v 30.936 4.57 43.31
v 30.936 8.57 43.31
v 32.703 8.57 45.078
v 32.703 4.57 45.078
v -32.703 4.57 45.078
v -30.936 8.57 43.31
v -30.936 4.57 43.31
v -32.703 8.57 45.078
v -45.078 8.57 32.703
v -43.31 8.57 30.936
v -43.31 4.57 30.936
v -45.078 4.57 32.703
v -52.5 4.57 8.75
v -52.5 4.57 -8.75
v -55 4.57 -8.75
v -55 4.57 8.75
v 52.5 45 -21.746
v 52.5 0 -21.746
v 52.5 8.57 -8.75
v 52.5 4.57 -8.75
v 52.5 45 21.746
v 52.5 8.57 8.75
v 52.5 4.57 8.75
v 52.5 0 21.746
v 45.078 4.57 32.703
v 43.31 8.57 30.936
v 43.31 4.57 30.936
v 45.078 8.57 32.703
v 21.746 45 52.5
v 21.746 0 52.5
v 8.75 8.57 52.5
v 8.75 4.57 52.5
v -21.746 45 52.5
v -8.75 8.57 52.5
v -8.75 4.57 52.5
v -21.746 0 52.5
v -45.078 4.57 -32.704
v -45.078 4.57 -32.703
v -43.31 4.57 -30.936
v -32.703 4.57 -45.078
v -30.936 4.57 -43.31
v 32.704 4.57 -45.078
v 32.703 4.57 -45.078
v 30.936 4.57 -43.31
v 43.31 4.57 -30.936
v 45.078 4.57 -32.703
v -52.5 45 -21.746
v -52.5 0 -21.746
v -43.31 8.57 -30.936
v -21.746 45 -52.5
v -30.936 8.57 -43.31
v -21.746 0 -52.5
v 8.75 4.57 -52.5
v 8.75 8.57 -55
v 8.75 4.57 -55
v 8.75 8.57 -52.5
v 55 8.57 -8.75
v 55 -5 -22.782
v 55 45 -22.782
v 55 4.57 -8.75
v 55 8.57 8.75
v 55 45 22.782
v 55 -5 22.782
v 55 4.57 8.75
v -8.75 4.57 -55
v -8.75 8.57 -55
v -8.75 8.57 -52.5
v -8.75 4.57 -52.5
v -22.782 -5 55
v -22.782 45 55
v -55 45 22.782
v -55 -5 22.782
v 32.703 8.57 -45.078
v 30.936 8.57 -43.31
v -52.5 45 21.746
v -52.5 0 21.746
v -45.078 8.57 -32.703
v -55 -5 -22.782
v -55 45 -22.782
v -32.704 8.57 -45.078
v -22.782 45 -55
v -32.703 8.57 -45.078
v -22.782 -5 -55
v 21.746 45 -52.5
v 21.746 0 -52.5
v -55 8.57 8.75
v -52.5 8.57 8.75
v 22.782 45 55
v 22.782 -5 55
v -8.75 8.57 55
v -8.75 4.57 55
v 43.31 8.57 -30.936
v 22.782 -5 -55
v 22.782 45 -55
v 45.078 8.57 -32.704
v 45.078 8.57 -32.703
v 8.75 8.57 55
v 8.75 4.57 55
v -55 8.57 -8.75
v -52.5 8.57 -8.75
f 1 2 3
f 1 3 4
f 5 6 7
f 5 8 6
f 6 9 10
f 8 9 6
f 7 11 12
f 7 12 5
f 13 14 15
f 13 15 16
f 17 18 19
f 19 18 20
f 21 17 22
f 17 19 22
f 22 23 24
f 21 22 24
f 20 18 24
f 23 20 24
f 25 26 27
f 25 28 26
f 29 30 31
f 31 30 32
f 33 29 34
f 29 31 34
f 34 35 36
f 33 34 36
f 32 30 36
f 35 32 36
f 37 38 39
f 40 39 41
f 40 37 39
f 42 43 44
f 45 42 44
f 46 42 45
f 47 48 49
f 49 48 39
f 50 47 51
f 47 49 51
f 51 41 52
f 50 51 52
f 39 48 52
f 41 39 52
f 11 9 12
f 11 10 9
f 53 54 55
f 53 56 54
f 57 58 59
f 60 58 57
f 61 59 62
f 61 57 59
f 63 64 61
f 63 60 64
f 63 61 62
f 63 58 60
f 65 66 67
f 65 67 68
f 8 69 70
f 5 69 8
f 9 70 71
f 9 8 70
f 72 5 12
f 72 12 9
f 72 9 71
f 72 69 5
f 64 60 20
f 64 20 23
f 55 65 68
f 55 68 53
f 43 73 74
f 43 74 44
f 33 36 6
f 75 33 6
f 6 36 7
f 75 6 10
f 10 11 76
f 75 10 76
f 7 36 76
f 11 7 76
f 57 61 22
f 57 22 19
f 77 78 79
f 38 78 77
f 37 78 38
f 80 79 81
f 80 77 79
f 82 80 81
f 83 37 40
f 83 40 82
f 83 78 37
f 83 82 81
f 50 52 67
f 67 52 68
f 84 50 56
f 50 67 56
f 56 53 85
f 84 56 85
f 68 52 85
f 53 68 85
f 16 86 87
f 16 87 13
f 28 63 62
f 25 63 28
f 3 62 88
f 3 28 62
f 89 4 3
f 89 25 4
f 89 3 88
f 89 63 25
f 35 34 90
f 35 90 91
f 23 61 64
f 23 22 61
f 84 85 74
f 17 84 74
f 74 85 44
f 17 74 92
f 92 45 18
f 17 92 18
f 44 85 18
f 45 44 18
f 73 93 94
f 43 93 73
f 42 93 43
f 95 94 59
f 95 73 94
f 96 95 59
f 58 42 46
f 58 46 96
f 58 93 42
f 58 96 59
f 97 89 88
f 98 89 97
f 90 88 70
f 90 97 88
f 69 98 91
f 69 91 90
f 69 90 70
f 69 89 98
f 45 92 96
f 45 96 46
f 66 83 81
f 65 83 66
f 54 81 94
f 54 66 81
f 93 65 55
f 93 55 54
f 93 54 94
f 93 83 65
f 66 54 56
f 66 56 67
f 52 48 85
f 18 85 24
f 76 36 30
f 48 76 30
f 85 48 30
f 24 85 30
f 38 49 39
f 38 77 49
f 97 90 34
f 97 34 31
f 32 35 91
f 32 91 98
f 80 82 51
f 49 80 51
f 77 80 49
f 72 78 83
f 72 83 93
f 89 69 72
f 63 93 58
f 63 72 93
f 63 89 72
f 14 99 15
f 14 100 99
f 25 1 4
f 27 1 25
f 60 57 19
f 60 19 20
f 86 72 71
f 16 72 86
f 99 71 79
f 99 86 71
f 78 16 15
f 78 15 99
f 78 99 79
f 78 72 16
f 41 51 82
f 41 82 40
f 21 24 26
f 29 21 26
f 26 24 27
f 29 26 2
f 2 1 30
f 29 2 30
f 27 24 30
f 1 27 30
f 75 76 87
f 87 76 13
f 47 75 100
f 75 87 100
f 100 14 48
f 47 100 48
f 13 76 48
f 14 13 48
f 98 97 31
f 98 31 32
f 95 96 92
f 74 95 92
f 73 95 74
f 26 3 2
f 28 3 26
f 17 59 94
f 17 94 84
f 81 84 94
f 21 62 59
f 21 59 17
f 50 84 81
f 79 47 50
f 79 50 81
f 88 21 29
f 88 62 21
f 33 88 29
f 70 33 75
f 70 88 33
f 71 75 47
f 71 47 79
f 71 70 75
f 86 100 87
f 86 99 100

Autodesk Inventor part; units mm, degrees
ref_plane "YZ Plane" through (0, 0, 0) normal (1, 0, 0) x (0, 1, 0)
ref_plane "XZ Plane" through (0, 0, 0) normal (0, 1, 0) x (-1, 0, 0)
ref_plane "XY Plane" through (0, 0, 0) normal (0, 0, 1) x (1, 0, 0)
sketch "Skizze4" plane through (0, 0, 0) normal (0, 1, 0) x (-1, 0, 0)
  line L0 (77, 0) -> (-77, 0) construction
  line L1 (0, -77) -> (0, 77) construction
  line L2 (27, 37.5) -> (-27, 37.5) construction
  line L3 (-27, 37.5) -> (-27, -37.5) construction
  line L4 (-27, -37.5) -> (27, -37.5) construction
  line L5 (27, -37.5) -> (27, 37.5) construction
  line L6 (55, -22.7817) -> (22.7817, -55)
  line L7 (22.7817, -55) -> (-22.7817, -55)
  line L8 (-22.7817, -55) -> (-55, -22.7817)
  line L9 (-55, -22.7817) -> (-55, 22.7817)
  line L10 (-55, 22.7817) -> (-22.7817, 55)
  line L11 (-22.7817, 55) -> (22.7817, 55)
  line L12 (22.7817, 55) -> (55, 22.7817)
  line L13 (55, 22.7817) -> (55, -22.7817)
  line L14 (52.5, -21.7462) -> (21.7462, -52.5)
  line L15 (21.7462, -52.5) -> (-21.7462, -52.5)
  line L16 (-21.7462, -52.5) -> (-52.5, -21.7462)
  line L17 (-52.5, -21.7462) -> (-52.5, 21.7462)
  line L18 (-52.5, 21.7462) -> (-21.7462, 52.5)
  line L19 (-21.7462, 52.5) -> (21.7462, 52.5)
  line L20 (21.7462, 52.5) -> (52.5, 21.7462)
  line L21 (52.5, 21.7462) -> (52.5, -21.7462)
  point P0 (0, 0)
  point P1 (0, 0)
  dimension "d4" = 75
  dimension "d5" = 54
  dimension "d7" = 2.5
  dimension "d22" = 110
extrude "Extrusion2" add sketch "Skizze4" along normal blind 45
sketch "Skizze5" plane through (0, 0, 0) normal (0, -1, 0) x (1, 0, 0)
  line L0 (21.7462, -52.5) -> (-21.7462, -52.5) projected
  line L1 (-21.7462, -52.5) -> (-52.5, -21.7462) projected
  line L2 (-52.5, -21.7462) -> (-52.5, 21.7462) projected
  line L3 (-52.5, 21.7462) -> (-21.7462, 52.5) projected
  line L4 (-21.7462, 52.5) -> (21.7462, 52.5) projected
  line L5 (21.7462, 52.5) -> (52.5, 21.7462) projected
  line L6 (52.5, 21.7462) -> (52.5, -21.7462) projected
  line L7 (52.5, -21.7462) -> (21.7462, -52.5) projected
  line L8 (-55, -22.7817) -> (-22.7817, -55) projected
  line L9 (-22.7817, -55) -> (22.7817, -55) projected
  line L10 (22.7817, -55) -> (55, -22.7817) projected
  line L11 (55, -22.7817) -> (55, 22.7817) projected
  line L12 (55, 22.7817) -> (22.7817, 55) projected
  line L13 (22.7817, 55) -> (-22.7817, 55) projected
  line L14 (-22.7817, 55) -> (-55, 22.7817) projected
  line L15 (-55, 22.7817) -> (-55, -22.7817) projected
  point P0 (0, 0)
extrude "Extrusion3" add sketch "Skizze5" along normal blind 5 contours L0 L1 L2 L3 L4 L5 L6 L7 | L15 L14 L13 L12 L11 L10 L9 L8
sketch "Skizze7" plane through (55, 45, 22.7817) normal (1, 0, 0) x (0, 0, -1)
  line L0 (14.032, -36.43) -> (31.532, -36.43)
  line L1 (31.532, -36.43) -> (31.532, -40.43)
  line L2 (31.532, -40.43) -> (14.032, -40.43)
  line L3 (14.032, -40.43) -> (14.032, -36.43)
  line L4 (45.5635, -50) -> (0, -50) projected
  line L5 (45.5635, 0) -> (45.5635, -50) projected
  point P0 (22.7817, -45)
  dimension "d13" = 9.57
  dimension "d14" = 17.5
  dimension "d15" = 4
  dimension "d16" = 14.0315
extrude "Extrusion4" cut sketch "Skizze7" against normal through all
pattern_circular "Runde Anordnung1" count 8 over 360 about axis through (0, -10, 0) along (0, 1, 0) of "Extrusion4"
properties part number "Oktagon" material "Kst - PVC (rigid/white)"
